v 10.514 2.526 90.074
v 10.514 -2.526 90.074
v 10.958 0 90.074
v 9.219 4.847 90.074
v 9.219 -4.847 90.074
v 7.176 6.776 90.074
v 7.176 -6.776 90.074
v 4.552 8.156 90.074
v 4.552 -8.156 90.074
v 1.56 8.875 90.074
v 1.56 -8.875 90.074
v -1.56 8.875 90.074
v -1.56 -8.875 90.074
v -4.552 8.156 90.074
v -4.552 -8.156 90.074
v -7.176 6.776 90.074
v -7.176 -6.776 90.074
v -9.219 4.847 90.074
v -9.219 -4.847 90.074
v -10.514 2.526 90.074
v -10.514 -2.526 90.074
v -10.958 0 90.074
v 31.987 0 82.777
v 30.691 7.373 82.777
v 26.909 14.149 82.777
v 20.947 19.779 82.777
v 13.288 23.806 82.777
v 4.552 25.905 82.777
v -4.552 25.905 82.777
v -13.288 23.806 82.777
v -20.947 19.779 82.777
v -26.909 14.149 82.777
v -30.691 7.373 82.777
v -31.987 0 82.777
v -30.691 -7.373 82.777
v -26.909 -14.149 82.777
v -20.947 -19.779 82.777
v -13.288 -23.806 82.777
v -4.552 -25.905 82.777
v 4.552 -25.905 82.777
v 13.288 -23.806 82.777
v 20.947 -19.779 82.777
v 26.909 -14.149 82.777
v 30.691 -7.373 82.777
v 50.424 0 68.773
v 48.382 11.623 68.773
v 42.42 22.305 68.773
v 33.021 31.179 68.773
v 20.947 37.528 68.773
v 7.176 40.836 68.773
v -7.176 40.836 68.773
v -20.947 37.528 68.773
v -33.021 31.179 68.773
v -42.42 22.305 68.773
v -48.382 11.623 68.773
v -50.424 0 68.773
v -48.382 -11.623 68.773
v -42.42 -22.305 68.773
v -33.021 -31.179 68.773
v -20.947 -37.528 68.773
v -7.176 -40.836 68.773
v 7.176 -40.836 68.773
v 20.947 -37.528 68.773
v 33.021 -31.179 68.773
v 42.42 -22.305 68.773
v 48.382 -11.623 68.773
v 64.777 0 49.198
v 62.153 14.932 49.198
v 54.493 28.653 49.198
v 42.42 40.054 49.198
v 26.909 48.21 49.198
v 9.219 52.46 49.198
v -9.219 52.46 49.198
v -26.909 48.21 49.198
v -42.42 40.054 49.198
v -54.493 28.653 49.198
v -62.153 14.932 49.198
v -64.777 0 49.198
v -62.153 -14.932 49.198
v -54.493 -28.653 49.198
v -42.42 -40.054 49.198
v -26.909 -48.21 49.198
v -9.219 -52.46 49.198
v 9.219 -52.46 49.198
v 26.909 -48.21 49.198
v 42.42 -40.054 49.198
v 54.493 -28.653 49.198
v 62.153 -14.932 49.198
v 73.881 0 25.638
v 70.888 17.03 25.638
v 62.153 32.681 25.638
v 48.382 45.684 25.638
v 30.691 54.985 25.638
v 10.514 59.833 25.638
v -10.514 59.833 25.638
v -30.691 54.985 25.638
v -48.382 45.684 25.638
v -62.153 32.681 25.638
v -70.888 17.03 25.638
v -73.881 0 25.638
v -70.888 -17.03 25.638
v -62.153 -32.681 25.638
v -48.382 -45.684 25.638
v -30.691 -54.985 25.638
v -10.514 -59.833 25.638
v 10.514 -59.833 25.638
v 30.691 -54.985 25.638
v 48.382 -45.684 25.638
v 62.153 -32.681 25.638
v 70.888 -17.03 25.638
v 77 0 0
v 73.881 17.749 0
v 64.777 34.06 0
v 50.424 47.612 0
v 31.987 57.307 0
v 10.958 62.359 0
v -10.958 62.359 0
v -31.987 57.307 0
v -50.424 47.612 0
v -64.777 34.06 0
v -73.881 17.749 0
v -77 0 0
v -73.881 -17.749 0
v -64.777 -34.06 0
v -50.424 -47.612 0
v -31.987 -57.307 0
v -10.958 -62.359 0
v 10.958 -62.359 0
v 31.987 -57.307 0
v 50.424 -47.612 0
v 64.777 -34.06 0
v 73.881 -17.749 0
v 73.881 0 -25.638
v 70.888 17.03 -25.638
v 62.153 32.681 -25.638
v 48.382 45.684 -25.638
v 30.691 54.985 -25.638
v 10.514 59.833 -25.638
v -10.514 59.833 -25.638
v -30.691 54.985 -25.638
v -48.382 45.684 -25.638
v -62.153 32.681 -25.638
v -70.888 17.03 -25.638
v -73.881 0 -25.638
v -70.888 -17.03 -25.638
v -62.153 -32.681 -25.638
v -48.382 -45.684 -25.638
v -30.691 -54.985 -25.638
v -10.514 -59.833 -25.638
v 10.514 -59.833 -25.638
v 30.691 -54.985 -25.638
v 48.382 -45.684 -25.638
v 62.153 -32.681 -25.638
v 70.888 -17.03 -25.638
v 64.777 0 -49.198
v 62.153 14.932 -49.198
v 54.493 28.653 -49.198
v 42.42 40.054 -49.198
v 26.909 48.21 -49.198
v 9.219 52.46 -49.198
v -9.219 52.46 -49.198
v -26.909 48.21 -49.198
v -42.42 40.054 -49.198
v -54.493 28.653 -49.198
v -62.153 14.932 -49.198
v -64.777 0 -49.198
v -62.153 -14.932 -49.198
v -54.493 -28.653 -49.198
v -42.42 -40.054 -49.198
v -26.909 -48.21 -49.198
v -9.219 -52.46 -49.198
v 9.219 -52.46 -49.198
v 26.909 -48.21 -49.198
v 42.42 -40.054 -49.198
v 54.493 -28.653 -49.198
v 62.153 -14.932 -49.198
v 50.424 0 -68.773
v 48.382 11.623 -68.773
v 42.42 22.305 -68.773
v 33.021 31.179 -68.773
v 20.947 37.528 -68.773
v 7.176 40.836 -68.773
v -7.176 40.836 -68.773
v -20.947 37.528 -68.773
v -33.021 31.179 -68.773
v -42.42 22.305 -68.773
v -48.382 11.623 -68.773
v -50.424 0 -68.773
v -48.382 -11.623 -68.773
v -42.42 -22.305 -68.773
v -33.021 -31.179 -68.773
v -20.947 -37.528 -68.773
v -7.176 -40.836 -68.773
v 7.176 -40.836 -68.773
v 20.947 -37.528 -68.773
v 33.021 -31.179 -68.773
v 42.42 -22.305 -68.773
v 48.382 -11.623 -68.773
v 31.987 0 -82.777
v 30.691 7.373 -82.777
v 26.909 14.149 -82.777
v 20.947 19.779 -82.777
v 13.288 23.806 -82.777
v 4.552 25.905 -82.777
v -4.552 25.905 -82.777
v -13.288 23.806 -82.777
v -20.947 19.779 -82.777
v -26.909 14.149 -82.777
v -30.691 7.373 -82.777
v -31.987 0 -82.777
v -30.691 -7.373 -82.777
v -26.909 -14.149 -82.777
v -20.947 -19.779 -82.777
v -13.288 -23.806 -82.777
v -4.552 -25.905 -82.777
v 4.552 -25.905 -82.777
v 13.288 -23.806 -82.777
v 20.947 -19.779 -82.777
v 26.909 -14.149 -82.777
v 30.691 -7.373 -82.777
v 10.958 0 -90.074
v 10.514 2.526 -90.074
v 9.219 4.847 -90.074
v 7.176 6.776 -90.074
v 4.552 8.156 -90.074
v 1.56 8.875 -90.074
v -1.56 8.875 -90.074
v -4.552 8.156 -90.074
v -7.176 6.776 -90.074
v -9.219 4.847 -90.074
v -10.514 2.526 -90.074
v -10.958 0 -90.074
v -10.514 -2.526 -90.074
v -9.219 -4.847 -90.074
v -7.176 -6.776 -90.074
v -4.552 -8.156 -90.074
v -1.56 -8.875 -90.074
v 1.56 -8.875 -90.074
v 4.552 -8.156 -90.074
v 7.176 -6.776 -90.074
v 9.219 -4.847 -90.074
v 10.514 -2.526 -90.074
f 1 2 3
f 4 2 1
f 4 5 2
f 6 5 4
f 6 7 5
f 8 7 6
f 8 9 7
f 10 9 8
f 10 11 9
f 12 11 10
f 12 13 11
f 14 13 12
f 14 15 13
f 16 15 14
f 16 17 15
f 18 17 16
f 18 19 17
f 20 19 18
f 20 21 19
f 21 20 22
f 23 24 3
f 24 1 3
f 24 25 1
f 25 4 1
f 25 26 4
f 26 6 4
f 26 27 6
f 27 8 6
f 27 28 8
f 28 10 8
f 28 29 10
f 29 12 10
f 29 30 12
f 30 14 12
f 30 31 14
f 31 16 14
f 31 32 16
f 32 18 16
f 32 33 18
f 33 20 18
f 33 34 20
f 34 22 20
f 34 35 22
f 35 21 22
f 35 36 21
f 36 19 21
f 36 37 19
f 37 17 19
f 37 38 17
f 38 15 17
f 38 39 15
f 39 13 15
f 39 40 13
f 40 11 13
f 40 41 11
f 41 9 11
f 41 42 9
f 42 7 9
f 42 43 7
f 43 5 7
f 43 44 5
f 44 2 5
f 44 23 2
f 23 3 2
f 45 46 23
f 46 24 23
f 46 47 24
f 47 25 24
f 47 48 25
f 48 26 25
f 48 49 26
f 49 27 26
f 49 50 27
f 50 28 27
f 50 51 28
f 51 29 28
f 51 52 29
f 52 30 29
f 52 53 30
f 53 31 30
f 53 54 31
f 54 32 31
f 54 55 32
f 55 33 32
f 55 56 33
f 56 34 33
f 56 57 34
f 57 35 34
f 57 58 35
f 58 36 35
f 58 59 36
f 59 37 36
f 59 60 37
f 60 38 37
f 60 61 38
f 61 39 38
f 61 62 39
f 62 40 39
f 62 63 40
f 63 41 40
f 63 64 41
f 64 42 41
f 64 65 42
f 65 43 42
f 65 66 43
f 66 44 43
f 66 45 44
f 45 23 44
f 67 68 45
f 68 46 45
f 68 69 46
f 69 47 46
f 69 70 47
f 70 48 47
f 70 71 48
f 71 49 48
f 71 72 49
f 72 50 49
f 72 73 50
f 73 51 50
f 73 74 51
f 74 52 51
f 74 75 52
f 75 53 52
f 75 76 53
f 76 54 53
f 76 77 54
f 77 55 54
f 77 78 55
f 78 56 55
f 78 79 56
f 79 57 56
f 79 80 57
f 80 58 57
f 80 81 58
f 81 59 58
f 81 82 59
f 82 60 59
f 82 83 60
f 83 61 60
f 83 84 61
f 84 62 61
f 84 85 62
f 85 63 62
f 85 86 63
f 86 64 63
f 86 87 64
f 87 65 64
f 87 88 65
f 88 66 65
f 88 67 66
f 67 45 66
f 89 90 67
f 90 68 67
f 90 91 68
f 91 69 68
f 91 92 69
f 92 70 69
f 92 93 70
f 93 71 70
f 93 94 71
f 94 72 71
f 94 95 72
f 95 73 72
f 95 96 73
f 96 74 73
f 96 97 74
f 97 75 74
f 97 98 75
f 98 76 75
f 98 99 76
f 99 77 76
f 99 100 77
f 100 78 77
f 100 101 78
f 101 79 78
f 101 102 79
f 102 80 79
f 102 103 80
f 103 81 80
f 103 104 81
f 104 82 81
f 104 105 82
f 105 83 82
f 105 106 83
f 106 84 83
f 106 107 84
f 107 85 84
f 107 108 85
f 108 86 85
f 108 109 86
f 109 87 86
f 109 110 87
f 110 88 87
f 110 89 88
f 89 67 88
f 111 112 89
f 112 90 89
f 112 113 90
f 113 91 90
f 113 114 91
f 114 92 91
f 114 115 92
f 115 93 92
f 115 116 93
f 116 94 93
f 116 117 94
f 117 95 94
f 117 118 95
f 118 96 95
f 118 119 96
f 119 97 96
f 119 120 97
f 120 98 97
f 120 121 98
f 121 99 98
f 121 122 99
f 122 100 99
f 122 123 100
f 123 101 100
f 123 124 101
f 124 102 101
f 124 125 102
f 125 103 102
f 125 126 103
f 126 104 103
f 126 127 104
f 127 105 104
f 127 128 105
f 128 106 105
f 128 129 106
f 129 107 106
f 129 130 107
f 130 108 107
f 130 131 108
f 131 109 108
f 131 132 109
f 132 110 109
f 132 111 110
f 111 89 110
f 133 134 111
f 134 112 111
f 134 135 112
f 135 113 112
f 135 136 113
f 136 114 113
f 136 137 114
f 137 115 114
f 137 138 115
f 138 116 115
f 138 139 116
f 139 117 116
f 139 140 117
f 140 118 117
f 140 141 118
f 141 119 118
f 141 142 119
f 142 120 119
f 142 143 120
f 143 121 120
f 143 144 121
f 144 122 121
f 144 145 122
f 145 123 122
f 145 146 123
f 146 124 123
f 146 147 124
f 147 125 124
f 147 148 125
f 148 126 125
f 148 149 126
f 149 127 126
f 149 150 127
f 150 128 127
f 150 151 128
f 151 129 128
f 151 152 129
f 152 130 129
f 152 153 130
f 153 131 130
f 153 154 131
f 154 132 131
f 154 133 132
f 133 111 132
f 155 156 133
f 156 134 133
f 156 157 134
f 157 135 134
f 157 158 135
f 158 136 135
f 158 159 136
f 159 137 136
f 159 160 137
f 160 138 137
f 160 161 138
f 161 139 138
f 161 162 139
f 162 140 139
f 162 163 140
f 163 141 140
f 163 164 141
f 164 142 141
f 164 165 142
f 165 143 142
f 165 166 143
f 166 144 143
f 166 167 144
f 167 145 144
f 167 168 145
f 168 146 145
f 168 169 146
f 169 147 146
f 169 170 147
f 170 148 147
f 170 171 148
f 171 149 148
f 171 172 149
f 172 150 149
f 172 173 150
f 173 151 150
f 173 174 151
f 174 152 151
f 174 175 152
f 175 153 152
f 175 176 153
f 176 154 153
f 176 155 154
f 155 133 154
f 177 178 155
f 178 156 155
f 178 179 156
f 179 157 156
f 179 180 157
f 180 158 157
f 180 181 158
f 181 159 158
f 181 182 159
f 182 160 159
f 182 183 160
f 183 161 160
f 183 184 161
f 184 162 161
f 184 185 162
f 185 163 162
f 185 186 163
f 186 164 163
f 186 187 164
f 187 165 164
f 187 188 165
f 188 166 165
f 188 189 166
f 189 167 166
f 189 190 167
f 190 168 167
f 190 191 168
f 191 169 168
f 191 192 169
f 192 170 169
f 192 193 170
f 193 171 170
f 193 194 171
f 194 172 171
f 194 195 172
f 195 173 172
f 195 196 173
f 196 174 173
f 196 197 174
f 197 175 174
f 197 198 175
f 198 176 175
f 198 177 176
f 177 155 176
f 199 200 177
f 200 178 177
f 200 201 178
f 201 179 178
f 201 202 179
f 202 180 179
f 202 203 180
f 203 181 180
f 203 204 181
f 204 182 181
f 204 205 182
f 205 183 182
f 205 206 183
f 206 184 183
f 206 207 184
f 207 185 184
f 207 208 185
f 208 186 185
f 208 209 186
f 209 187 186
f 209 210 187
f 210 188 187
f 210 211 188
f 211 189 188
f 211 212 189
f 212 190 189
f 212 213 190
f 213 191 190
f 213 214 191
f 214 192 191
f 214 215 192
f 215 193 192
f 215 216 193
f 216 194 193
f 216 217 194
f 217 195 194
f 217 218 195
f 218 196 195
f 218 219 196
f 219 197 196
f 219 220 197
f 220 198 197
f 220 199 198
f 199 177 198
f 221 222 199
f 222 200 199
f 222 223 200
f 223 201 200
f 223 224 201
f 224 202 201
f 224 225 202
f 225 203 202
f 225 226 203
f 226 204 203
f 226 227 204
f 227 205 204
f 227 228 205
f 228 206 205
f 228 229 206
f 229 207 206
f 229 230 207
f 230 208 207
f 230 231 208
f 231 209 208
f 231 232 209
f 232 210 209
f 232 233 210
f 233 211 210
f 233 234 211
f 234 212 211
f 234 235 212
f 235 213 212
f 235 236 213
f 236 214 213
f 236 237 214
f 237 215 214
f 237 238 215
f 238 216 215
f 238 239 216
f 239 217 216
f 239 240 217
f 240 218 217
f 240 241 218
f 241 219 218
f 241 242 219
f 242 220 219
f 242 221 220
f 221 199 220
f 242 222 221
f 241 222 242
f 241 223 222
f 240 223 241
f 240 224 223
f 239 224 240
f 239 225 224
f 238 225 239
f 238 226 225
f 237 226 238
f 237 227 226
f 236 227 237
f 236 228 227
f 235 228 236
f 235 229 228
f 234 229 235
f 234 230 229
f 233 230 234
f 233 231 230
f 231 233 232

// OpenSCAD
// Generated by SolidPython 1.0.1 on 2020-07-29 00:46:49


scale(v = [11, 9, 13]) {
	sphere(r = 7);
}
/***********************************************
*********      SolidPython code:      **********
************************************************
 
# import packages: SolidPython
from solid import *
from solid.utils import *
from itertools import chain, combinations, permutations


class Resize:

    def __init__(self, scad_file):
        self.scad_file = scad_file
        #self.scad_file = import_scad(scad_file)
        # cone/cylinder param:
        self.r1 = 0
        self.r2 = 0
        self.h = 0
        # rectangular prism param:
        self.w = 0
        self.l = 0
        # ellipse param:
        self.r = 0

    # import OpenScad code (file name corresponds to shape)


    # classify shape + parameters
    def assign(self, param1, param2, param3):
        if self.scad_file == 'cone.scad':
            self.r1 = param1
            self.r2 = param2
            self.h = param3
        elif self.scad_file == 'cylinder.scad':
            self.r1 = param1
            self.r2 = param2
            self.h = param3
        elif self.scad_file == 'rectangularPrism.scad':
            self.h = param1
            self.l = param2
            self.w = param3
        else:
            self.r = param1
            self.h = param2

    # resize parameters
    def iterate(self):
        x = range(3, 20, 2)
        i = 1
        if self.scad_file == 'cone.scad':
            tempList = list(permutations(x, 2))
            for temp in tempList:
                param1 = temp[0]
                param2 = temp[1]
                filepath = 'produced_scad_files/' + 'cone' + str(param1) + '_' + str(param2) + '_' + '.scad'
                scad_render_to_file(cylinder(h=param1, r1=param2, r2=0), filepath)

        elif self.scad_file == 'cylinder.scad':
            tempList = list(permutations(x, 3))
            for temp in tempList:
                param1 = temp[0]
                param2 = temp[1]
                filepath = 'produced_scad_files/' + 'cylinder' + str(param1) + '_' + str(param2) + '_' + '.scad'
                scad_render_to_file(cylinder(h=param1, r1=param2, r2=param2), filepath)

        elif self.scad_file == 'rectangularPrism.scad':
            tempList = list(permutations(x, 3))
            for temp in tempList:
                param1 = temp[0]
                param2 = temp[1]
                param3 = temp[2]
                filepath = 'produced_scad_files/' + 'rectangularPrism' + str(param1) + '_' + str(param2) + '_' + str(
                    param3) + '.scad'
                scad_render_to_file(cube(size=(param1, param2, param3)), filepath)

        elif self.scad_file == 'ellipse.scad':
            tempList = list(permutations(x, 4))
            for temp in tempList:
                param1 = temp[0]
                param2 = temp[1]
                param3 = temp[2]
                param4 = temp[3]
                filepath = 'produced_scad_files/' + 'ellipse' + str(param1) + '_' + str(param2) + '_' + str(param3) + '_' + str(param4) + '.scad'
                scad_render_to_file(scale([param1, param2, param3])(sphere(r=param4)), filepath)

    def render_to_scadfile(self):
        scad_render_to_file(scad, 'example.scad') 
 
************************************************/
